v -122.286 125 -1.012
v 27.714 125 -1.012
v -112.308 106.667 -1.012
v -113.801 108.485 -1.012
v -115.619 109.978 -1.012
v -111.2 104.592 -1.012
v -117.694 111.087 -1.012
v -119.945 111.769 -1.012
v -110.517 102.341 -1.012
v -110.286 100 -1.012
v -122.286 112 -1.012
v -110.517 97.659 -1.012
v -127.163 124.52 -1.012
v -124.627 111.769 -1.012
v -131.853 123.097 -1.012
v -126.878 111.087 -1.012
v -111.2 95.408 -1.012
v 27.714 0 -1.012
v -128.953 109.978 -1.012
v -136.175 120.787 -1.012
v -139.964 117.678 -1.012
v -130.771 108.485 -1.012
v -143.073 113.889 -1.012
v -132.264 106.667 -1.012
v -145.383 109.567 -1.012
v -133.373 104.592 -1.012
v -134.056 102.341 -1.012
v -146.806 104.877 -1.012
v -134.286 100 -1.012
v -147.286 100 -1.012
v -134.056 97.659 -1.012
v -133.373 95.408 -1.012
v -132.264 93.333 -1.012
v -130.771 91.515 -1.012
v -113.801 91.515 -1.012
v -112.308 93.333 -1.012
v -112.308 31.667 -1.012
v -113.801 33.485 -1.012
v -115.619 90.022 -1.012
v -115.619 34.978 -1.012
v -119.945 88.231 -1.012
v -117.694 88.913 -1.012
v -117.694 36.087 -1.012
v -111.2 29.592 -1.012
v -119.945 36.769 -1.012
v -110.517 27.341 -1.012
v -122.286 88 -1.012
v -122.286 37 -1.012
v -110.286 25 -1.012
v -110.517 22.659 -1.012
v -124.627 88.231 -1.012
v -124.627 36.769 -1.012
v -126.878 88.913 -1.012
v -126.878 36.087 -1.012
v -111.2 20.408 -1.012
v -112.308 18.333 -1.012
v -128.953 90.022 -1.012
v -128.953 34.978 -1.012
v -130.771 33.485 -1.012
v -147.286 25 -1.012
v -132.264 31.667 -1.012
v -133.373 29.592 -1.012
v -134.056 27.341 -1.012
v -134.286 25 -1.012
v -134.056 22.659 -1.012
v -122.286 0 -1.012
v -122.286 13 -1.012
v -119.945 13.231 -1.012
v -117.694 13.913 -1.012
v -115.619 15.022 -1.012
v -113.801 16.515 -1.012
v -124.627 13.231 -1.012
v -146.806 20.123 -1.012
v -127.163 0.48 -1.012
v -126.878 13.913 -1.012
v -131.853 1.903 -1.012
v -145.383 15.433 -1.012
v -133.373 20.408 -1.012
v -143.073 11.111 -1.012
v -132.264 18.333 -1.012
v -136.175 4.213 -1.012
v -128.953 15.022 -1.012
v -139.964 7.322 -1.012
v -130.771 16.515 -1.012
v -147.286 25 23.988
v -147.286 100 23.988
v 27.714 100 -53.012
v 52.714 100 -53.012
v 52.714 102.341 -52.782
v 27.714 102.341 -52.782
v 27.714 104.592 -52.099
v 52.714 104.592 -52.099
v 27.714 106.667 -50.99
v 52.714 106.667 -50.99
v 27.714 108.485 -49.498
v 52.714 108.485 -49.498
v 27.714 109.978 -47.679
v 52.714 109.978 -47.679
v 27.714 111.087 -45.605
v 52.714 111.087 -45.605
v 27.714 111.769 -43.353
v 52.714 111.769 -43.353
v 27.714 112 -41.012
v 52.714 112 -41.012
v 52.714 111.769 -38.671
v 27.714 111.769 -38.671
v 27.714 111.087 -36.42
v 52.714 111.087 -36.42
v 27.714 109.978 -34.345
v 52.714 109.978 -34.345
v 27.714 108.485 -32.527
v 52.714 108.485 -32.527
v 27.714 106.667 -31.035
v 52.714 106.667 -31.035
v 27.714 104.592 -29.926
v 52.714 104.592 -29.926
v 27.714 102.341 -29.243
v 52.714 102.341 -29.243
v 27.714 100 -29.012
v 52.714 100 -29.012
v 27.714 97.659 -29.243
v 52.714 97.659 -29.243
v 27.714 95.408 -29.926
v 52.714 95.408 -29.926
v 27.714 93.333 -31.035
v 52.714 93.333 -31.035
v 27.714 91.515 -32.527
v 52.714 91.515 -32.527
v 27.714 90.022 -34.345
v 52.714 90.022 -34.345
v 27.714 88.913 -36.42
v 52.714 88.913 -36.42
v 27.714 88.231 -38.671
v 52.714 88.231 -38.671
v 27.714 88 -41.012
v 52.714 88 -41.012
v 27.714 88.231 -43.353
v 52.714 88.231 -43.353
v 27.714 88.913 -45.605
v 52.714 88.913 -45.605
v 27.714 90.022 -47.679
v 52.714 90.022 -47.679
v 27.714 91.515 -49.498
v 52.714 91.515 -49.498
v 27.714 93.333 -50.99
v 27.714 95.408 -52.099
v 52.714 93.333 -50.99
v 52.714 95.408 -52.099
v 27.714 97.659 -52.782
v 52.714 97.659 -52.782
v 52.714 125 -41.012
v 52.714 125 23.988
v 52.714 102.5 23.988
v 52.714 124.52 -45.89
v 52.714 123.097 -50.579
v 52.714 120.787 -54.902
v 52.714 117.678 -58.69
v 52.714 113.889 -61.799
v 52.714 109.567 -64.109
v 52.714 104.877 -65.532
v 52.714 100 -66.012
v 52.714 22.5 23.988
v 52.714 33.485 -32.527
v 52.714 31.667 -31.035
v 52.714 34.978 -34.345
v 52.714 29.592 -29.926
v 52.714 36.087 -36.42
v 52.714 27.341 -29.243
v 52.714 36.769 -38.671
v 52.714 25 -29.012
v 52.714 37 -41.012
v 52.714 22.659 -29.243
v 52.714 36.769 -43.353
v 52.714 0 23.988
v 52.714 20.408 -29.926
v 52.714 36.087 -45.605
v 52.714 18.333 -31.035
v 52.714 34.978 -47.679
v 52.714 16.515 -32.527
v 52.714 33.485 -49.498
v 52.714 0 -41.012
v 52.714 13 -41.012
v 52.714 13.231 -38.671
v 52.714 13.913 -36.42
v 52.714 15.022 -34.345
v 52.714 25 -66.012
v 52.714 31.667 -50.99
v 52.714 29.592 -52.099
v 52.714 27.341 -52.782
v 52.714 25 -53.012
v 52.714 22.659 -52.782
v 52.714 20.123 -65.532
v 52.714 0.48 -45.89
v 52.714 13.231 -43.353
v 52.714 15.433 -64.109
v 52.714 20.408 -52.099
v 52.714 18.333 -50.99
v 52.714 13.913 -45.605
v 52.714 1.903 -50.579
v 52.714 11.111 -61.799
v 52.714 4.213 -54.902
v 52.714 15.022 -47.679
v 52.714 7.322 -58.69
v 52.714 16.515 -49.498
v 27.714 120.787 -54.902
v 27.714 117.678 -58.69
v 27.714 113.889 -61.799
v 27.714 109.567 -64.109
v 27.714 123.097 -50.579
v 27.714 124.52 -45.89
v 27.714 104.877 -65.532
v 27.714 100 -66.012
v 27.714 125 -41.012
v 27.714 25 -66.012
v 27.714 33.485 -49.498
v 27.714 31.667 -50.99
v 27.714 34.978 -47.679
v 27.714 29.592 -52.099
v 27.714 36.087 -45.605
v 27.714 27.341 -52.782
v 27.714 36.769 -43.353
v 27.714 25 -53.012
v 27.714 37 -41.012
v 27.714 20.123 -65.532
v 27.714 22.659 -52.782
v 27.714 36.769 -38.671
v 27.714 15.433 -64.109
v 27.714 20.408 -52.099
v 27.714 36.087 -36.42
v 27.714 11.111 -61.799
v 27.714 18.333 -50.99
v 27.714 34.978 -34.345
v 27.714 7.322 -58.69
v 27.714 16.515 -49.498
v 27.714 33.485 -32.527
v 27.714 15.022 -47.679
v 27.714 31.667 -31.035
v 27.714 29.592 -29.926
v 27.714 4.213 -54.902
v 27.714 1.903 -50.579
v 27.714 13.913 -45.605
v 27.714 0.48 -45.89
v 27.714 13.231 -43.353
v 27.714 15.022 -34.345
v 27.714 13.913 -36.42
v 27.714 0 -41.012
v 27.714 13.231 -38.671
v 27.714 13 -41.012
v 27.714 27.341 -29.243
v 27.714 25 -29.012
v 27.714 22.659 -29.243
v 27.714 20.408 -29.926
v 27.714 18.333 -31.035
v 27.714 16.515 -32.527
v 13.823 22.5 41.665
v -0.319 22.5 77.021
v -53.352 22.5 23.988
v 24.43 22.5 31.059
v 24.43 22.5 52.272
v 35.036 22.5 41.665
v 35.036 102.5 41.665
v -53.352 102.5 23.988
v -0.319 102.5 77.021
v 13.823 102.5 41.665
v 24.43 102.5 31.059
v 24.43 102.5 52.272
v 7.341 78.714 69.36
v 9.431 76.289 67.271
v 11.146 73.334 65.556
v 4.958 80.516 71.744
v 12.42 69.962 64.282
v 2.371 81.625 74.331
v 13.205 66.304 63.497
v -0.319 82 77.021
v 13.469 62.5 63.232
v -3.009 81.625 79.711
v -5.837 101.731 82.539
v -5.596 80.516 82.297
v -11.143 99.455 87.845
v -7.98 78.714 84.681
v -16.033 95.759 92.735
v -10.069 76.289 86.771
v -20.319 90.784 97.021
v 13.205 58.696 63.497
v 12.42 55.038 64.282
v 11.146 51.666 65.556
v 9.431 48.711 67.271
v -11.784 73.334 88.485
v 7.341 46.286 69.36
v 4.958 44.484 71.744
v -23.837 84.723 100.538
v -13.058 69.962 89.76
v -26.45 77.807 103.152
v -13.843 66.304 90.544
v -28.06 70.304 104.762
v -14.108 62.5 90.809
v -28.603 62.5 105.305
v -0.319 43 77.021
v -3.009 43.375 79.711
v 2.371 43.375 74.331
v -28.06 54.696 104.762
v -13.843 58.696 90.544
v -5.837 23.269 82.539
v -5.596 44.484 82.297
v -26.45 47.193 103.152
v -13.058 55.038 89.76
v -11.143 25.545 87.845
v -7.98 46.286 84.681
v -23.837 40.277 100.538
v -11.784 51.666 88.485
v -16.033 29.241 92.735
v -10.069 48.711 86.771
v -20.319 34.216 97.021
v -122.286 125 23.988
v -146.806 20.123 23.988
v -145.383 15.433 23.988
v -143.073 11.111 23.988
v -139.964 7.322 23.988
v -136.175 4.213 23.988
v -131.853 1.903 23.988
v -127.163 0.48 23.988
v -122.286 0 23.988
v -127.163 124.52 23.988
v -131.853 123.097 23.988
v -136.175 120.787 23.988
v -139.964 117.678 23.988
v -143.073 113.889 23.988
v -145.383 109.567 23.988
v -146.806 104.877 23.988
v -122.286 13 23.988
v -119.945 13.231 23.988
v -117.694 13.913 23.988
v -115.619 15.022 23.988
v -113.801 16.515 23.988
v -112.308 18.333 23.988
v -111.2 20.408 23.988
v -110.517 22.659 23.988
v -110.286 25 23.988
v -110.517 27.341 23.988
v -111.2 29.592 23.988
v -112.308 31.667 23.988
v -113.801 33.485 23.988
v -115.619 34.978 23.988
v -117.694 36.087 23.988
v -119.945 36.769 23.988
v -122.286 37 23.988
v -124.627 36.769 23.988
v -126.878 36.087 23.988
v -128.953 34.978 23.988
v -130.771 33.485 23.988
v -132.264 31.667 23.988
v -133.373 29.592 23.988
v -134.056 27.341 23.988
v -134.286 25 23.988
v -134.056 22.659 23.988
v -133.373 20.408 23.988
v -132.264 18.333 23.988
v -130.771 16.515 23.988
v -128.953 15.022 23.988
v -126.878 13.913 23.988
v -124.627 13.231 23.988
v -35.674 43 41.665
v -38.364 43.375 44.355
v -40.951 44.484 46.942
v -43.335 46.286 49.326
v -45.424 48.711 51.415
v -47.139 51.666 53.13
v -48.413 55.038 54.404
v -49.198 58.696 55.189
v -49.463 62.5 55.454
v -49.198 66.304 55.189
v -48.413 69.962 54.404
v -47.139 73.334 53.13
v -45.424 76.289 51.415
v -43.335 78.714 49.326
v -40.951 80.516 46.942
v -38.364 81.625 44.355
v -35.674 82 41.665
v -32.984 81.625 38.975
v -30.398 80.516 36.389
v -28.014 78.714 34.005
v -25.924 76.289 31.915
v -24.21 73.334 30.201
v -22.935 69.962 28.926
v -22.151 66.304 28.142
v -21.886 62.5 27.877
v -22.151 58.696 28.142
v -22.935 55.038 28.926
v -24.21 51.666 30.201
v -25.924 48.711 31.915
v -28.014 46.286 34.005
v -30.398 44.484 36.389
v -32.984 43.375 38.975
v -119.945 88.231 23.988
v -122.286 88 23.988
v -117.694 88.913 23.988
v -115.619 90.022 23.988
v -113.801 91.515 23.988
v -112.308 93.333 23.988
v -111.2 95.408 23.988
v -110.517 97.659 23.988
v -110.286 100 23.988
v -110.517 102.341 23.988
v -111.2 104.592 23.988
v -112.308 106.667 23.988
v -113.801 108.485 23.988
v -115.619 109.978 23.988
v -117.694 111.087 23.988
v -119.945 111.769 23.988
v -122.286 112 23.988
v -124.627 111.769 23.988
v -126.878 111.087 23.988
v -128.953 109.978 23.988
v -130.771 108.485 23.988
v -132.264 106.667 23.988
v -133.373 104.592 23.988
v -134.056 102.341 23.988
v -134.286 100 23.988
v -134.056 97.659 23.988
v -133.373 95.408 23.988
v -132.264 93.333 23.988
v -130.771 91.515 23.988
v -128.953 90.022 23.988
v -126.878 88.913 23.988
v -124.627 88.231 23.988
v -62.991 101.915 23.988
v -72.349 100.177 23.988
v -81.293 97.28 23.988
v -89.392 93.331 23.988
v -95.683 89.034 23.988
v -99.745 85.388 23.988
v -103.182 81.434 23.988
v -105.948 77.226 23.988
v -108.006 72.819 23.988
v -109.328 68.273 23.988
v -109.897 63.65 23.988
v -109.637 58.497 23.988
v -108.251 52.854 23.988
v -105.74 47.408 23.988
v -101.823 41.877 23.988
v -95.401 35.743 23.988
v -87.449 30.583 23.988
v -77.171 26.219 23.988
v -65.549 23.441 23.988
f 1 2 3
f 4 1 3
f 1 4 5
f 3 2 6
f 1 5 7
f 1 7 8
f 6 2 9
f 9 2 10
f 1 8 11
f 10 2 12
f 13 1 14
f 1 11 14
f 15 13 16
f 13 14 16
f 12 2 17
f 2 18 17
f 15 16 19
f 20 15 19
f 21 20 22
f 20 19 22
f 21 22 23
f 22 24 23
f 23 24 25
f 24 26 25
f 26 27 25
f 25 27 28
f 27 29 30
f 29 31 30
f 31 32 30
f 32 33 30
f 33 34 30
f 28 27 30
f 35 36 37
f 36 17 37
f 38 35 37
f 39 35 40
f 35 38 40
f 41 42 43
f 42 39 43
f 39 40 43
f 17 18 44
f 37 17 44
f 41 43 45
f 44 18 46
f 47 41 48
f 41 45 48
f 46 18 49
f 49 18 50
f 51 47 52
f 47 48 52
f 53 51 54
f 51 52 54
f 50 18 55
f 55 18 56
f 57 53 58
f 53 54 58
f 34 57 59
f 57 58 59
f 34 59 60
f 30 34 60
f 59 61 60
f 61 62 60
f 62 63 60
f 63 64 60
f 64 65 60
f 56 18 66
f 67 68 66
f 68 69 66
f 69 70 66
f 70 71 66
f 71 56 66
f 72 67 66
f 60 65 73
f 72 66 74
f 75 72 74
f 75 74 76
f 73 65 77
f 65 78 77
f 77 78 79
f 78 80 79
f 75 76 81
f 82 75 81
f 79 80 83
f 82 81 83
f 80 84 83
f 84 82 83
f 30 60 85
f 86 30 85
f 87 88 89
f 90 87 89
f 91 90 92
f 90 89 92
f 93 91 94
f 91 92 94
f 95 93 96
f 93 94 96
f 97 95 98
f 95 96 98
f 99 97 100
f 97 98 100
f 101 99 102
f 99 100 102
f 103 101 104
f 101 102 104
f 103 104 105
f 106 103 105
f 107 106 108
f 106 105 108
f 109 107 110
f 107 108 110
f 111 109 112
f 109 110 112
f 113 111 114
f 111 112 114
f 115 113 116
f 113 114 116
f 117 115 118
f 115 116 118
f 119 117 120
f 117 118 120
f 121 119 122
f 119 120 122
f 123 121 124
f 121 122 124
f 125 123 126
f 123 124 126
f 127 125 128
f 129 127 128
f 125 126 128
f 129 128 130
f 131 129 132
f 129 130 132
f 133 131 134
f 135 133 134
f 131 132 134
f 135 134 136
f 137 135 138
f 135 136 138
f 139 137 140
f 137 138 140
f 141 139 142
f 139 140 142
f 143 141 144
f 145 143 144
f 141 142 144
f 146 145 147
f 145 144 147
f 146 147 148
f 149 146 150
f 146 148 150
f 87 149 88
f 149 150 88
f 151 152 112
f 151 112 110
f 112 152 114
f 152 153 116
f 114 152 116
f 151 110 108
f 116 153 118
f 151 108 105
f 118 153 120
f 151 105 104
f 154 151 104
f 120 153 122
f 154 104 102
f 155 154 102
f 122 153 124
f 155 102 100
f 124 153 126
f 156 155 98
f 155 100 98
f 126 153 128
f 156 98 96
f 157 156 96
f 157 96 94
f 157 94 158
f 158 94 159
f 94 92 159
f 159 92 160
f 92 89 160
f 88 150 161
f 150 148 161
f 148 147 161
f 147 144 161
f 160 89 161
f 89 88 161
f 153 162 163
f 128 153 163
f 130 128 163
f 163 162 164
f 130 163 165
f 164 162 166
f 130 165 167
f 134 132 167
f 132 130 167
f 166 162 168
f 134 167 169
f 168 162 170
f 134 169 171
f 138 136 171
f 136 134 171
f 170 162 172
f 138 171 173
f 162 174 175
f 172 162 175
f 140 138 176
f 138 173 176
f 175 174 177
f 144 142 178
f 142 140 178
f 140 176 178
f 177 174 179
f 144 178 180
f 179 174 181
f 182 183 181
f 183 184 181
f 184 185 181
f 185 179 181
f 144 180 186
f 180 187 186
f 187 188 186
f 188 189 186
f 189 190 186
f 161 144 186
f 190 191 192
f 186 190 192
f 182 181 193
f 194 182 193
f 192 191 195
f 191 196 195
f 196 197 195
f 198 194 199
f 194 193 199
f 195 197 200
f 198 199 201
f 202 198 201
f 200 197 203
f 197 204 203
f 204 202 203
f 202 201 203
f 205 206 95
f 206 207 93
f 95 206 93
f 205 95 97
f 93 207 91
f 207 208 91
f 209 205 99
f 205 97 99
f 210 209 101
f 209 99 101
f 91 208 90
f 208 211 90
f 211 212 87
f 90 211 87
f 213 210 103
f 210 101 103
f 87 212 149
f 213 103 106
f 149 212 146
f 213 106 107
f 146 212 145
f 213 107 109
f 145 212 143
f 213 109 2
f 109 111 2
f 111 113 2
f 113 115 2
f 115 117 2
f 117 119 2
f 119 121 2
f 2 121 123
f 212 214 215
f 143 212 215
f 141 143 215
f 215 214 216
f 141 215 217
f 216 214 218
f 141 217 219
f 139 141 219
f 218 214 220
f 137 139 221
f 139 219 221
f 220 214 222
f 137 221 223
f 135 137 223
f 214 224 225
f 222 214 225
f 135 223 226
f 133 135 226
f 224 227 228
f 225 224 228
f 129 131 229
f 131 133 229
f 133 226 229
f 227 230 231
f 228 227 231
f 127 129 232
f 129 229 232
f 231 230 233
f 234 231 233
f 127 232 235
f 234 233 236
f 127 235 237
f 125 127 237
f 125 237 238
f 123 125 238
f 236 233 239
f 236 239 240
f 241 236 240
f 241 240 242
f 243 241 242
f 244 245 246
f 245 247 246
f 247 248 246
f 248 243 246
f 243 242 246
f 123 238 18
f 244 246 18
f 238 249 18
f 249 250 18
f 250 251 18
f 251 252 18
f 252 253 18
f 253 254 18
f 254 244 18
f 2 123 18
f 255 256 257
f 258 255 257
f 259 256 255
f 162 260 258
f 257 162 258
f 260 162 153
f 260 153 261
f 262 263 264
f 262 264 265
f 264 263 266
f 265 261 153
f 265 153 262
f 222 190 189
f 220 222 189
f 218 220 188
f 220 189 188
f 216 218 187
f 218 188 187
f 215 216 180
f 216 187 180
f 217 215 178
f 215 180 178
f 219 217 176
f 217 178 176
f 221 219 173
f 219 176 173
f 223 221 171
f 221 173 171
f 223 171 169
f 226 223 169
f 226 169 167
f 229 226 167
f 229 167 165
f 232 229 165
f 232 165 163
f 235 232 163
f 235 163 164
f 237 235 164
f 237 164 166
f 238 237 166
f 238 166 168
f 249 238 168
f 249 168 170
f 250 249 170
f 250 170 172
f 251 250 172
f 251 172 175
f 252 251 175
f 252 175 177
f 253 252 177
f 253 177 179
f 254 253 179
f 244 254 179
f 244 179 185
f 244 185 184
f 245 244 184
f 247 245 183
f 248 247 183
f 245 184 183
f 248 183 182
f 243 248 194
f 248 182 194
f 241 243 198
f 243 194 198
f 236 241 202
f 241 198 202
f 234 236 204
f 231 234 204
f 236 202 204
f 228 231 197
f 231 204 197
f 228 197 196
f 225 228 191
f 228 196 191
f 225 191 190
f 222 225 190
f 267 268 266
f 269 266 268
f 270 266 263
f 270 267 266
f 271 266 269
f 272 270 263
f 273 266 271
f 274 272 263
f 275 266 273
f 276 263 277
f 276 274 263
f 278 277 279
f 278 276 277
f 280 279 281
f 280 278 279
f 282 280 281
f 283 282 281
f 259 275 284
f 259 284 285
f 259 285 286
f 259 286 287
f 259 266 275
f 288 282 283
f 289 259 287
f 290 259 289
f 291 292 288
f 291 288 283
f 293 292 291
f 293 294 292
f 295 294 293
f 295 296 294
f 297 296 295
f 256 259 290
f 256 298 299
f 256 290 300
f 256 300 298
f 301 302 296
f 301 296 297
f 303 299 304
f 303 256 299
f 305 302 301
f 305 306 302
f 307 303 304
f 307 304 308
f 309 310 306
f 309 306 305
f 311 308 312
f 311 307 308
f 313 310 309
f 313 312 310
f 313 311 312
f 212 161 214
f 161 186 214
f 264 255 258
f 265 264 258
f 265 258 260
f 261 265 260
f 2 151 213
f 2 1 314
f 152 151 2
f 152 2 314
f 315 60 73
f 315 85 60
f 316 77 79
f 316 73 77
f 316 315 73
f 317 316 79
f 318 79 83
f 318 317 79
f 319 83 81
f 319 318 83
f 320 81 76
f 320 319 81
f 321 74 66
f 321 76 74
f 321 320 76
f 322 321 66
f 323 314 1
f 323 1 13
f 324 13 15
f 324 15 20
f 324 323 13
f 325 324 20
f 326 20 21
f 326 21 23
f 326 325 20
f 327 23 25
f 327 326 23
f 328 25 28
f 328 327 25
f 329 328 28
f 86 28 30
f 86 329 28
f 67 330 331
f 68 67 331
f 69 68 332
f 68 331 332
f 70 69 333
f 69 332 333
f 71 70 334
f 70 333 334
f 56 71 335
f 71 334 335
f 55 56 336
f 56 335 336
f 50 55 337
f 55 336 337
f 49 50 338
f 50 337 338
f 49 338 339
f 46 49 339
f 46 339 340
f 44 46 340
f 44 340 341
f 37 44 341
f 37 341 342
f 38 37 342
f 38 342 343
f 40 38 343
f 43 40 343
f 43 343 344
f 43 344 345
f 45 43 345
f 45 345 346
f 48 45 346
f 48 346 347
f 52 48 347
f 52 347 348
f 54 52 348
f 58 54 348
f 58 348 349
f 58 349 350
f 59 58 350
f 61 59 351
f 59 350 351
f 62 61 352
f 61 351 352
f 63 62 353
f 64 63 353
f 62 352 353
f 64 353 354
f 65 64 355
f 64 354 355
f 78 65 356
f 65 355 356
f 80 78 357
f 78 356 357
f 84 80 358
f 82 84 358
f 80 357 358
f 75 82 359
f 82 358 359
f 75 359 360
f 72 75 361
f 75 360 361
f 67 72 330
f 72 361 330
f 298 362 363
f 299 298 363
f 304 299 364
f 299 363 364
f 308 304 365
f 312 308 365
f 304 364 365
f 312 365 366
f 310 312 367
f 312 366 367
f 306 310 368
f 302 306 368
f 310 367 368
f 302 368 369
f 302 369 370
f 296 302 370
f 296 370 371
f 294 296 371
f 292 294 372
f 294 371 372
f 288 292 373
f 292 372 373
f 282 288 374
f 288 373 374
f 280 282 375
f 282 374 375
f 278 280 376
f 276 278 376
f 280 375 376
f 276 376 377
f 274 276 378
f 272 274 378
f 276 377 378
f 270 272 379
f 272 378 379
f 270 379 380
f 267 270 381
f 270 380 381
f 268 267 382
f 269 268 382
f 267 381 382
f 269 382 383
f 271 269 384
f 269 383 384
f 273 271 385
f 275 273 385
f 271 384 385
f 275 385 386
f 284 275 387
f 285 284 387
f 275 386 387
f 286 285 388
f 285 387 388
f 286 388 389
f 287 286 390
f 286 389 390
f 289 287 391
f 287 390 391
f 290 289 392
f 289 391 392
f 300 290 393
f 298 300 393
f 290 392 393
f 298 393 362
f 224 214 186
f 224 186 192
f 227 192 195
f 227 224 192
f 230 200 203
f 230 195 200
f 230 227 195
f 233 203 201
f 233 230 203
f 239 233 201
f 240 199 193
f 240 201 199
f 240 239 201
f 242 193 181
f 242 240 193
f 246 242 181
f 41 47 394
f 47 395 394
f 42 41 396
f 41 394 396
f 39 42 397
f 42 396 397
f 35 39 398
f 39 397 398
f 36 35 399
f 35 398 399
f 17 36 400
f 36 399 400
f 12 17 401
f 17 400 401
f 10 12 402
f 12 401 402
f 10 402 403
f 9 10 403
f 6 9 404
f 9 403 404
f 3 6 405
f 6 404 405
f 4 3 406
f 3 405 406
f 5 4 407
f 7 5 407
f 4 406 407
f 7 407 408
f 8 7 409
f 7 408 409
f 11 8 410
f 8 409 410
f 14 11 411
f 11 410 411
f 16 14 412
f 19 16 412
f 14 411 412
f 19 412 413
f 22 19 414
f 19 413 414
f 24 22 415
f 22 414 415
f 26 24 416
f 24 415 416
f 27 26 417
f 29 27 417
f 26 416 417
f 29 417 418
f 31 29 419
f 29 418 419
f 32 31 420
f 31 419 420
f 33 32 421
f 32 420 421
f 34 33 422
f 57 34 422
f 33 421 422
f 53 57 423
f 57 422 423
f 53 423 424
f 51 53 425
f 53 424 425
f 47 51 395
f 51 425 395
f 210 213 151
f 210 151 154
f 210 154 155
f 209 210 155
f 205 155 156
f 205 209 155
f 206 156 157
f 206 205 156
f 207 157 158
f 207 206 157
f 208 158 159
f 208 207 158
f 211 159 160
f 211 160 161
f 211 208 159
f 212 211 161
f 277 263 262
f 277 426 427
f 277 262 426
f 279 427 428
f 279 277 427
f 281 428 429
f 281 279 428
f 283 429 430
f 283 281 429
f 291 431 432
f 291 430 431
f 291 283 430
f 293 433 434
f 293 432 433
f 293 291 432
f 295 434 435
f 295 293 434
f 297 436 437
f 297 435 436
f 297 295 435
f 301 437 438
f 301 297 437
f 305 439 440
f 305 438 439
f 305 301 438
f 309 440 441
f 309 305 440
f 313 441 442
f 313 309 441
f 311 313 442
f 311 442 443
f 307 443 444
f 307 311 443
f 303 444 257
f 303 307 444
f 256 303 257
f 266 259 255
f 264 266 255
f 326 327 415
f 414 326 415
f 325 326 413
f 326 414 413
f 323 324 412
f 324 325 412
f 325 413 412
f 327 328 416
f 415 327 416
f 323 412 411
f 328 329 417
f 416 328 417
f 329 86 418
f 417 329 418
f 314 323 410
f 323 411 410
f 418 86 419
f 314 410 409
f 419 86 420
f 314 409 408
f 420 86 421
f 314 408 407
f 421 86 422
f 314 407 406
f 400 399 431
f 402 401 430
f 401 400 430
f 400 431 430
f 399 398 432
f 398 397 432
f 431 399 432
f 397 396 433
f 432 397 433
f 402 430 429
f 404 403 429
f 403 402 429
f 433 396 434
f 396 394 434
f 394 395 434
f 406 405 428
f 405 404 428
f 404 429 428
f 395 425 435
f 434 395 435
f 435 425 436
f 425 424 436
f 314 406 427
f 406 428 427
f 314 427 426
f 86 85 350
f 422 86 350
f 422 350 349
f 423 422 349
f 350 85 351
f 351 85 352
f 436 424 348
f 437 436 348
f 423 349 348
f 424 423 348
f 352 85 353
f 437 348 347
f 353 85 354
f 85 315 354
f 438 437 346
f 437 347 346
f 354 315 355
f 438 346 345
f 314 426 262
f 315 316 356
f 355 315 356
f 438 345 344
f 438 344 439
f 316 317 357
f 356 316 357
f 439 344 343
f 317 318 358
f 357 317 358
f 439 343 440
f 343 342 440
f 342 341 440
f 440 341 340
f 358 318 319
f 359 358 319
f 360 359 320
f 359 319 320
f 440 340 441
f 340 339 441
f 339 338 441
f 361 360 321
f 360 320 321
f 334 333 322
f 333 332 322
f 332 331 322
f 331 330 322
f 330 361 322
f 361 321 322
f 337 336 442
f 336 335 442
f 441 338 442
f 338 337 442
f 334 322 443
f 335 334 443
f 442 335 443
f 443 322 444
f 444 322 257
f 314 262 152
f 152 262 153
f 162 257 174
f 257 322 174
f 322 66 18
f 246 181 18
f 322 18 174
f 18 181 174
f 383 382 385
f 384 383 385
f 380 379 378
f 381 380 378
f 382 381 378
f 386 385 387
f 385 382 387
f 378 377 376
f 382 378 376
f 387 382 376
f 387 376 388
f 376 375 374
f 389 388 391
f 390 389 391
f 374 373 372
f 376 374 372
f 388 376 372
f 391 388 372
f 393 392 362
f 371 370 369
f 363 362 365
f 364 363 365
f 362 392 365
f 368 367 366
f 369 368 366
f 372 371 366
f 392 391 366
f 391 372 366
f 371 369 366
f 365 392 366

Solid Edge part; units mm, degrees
sketch "Sketch1" plane through (0, 0, 0) normal (0, -1, 0) x (1, 0, 0)
  line L0 (-147.2861, 23.9877) -> (52.7139, 23.9877)
  line L1 (52.7139, 23.9877) -> (52.7139, -66.0123)
  line L2 (52.7139, -66.0123) -> (27.7139, -66.0123)
  line L3 (27.7139, -66.0123) -> (27.7139, -1.0123)
  line L4 (27.7139, -1.0123) -> (-147.2861, -1.0123)
  line L5 (-147.2861, -1.0123) -> (-147.2861, 23.9877)
extrude "Protrusion1" add sketch "Sketch1" against normal blind 125
sketch "Sketch2" plane through (84.5337, 62.5, -7.8321) normal (0.7071, 0, 0.7071) x (0, 1, 0)
  line L0 (-40, 45) -> (-40, 120)
  arc A0 (-40, 120) -> (40, 120) centre (0, 120) cw
  line L1 (40, 120) -> (40, 45)
extrude "Protrusion2" add sketch "Sketch2" against normal up to next material side at (26.1974, 22.55, 50.5042)
fillet "Round1" radius 25 4 edges at (-147.2861, 0, 11.4877) (40.2139, 0, -66.0123) (40.2139, 125, -66.0123) (-147.2861, 125, 11.4877)
hole "Hole1" at (52.7139, 25, -41.0123) direction (-1, 0, 0) diameter 24 end up to next
hole "Hole_2" at (52.7139, 100, -41.0123) direction (-1, 0, 0) diameter 24 end up to next
hole "Hole_3" at (-122.2861, 25, 23.9877) direction (0, 0, -1) diameter 24 end up to next
hole "Hole_4" at (-122.2861, 100, 23.9877) direction (0, 0, -1) diameter 24 end up to next
hole "Hole_5" at (-0.3191, 62.5, 77.0207) direction (-0.7071, 0, -0.7071) diameter 39 depth 50
sketch "Sketch3" plane through (-0.3191, 22.5, 50.5042) normal (0, -1, 0) x (1, 0, 0)
  line L0 (24.7487, 1.7678) -> (14.1421, -8.8388)
  line L1 (14.1421, -8.8388) -> (24.7487, -19.4454)
  line L2 (24.7487, -19.4454) -> (35.3553, -8.8388)
extrude "Cutout1" cut sketch "Sketch3" against normal through all material side at (19.1617, 22.5, 46.9333)
properties material "Steel"
